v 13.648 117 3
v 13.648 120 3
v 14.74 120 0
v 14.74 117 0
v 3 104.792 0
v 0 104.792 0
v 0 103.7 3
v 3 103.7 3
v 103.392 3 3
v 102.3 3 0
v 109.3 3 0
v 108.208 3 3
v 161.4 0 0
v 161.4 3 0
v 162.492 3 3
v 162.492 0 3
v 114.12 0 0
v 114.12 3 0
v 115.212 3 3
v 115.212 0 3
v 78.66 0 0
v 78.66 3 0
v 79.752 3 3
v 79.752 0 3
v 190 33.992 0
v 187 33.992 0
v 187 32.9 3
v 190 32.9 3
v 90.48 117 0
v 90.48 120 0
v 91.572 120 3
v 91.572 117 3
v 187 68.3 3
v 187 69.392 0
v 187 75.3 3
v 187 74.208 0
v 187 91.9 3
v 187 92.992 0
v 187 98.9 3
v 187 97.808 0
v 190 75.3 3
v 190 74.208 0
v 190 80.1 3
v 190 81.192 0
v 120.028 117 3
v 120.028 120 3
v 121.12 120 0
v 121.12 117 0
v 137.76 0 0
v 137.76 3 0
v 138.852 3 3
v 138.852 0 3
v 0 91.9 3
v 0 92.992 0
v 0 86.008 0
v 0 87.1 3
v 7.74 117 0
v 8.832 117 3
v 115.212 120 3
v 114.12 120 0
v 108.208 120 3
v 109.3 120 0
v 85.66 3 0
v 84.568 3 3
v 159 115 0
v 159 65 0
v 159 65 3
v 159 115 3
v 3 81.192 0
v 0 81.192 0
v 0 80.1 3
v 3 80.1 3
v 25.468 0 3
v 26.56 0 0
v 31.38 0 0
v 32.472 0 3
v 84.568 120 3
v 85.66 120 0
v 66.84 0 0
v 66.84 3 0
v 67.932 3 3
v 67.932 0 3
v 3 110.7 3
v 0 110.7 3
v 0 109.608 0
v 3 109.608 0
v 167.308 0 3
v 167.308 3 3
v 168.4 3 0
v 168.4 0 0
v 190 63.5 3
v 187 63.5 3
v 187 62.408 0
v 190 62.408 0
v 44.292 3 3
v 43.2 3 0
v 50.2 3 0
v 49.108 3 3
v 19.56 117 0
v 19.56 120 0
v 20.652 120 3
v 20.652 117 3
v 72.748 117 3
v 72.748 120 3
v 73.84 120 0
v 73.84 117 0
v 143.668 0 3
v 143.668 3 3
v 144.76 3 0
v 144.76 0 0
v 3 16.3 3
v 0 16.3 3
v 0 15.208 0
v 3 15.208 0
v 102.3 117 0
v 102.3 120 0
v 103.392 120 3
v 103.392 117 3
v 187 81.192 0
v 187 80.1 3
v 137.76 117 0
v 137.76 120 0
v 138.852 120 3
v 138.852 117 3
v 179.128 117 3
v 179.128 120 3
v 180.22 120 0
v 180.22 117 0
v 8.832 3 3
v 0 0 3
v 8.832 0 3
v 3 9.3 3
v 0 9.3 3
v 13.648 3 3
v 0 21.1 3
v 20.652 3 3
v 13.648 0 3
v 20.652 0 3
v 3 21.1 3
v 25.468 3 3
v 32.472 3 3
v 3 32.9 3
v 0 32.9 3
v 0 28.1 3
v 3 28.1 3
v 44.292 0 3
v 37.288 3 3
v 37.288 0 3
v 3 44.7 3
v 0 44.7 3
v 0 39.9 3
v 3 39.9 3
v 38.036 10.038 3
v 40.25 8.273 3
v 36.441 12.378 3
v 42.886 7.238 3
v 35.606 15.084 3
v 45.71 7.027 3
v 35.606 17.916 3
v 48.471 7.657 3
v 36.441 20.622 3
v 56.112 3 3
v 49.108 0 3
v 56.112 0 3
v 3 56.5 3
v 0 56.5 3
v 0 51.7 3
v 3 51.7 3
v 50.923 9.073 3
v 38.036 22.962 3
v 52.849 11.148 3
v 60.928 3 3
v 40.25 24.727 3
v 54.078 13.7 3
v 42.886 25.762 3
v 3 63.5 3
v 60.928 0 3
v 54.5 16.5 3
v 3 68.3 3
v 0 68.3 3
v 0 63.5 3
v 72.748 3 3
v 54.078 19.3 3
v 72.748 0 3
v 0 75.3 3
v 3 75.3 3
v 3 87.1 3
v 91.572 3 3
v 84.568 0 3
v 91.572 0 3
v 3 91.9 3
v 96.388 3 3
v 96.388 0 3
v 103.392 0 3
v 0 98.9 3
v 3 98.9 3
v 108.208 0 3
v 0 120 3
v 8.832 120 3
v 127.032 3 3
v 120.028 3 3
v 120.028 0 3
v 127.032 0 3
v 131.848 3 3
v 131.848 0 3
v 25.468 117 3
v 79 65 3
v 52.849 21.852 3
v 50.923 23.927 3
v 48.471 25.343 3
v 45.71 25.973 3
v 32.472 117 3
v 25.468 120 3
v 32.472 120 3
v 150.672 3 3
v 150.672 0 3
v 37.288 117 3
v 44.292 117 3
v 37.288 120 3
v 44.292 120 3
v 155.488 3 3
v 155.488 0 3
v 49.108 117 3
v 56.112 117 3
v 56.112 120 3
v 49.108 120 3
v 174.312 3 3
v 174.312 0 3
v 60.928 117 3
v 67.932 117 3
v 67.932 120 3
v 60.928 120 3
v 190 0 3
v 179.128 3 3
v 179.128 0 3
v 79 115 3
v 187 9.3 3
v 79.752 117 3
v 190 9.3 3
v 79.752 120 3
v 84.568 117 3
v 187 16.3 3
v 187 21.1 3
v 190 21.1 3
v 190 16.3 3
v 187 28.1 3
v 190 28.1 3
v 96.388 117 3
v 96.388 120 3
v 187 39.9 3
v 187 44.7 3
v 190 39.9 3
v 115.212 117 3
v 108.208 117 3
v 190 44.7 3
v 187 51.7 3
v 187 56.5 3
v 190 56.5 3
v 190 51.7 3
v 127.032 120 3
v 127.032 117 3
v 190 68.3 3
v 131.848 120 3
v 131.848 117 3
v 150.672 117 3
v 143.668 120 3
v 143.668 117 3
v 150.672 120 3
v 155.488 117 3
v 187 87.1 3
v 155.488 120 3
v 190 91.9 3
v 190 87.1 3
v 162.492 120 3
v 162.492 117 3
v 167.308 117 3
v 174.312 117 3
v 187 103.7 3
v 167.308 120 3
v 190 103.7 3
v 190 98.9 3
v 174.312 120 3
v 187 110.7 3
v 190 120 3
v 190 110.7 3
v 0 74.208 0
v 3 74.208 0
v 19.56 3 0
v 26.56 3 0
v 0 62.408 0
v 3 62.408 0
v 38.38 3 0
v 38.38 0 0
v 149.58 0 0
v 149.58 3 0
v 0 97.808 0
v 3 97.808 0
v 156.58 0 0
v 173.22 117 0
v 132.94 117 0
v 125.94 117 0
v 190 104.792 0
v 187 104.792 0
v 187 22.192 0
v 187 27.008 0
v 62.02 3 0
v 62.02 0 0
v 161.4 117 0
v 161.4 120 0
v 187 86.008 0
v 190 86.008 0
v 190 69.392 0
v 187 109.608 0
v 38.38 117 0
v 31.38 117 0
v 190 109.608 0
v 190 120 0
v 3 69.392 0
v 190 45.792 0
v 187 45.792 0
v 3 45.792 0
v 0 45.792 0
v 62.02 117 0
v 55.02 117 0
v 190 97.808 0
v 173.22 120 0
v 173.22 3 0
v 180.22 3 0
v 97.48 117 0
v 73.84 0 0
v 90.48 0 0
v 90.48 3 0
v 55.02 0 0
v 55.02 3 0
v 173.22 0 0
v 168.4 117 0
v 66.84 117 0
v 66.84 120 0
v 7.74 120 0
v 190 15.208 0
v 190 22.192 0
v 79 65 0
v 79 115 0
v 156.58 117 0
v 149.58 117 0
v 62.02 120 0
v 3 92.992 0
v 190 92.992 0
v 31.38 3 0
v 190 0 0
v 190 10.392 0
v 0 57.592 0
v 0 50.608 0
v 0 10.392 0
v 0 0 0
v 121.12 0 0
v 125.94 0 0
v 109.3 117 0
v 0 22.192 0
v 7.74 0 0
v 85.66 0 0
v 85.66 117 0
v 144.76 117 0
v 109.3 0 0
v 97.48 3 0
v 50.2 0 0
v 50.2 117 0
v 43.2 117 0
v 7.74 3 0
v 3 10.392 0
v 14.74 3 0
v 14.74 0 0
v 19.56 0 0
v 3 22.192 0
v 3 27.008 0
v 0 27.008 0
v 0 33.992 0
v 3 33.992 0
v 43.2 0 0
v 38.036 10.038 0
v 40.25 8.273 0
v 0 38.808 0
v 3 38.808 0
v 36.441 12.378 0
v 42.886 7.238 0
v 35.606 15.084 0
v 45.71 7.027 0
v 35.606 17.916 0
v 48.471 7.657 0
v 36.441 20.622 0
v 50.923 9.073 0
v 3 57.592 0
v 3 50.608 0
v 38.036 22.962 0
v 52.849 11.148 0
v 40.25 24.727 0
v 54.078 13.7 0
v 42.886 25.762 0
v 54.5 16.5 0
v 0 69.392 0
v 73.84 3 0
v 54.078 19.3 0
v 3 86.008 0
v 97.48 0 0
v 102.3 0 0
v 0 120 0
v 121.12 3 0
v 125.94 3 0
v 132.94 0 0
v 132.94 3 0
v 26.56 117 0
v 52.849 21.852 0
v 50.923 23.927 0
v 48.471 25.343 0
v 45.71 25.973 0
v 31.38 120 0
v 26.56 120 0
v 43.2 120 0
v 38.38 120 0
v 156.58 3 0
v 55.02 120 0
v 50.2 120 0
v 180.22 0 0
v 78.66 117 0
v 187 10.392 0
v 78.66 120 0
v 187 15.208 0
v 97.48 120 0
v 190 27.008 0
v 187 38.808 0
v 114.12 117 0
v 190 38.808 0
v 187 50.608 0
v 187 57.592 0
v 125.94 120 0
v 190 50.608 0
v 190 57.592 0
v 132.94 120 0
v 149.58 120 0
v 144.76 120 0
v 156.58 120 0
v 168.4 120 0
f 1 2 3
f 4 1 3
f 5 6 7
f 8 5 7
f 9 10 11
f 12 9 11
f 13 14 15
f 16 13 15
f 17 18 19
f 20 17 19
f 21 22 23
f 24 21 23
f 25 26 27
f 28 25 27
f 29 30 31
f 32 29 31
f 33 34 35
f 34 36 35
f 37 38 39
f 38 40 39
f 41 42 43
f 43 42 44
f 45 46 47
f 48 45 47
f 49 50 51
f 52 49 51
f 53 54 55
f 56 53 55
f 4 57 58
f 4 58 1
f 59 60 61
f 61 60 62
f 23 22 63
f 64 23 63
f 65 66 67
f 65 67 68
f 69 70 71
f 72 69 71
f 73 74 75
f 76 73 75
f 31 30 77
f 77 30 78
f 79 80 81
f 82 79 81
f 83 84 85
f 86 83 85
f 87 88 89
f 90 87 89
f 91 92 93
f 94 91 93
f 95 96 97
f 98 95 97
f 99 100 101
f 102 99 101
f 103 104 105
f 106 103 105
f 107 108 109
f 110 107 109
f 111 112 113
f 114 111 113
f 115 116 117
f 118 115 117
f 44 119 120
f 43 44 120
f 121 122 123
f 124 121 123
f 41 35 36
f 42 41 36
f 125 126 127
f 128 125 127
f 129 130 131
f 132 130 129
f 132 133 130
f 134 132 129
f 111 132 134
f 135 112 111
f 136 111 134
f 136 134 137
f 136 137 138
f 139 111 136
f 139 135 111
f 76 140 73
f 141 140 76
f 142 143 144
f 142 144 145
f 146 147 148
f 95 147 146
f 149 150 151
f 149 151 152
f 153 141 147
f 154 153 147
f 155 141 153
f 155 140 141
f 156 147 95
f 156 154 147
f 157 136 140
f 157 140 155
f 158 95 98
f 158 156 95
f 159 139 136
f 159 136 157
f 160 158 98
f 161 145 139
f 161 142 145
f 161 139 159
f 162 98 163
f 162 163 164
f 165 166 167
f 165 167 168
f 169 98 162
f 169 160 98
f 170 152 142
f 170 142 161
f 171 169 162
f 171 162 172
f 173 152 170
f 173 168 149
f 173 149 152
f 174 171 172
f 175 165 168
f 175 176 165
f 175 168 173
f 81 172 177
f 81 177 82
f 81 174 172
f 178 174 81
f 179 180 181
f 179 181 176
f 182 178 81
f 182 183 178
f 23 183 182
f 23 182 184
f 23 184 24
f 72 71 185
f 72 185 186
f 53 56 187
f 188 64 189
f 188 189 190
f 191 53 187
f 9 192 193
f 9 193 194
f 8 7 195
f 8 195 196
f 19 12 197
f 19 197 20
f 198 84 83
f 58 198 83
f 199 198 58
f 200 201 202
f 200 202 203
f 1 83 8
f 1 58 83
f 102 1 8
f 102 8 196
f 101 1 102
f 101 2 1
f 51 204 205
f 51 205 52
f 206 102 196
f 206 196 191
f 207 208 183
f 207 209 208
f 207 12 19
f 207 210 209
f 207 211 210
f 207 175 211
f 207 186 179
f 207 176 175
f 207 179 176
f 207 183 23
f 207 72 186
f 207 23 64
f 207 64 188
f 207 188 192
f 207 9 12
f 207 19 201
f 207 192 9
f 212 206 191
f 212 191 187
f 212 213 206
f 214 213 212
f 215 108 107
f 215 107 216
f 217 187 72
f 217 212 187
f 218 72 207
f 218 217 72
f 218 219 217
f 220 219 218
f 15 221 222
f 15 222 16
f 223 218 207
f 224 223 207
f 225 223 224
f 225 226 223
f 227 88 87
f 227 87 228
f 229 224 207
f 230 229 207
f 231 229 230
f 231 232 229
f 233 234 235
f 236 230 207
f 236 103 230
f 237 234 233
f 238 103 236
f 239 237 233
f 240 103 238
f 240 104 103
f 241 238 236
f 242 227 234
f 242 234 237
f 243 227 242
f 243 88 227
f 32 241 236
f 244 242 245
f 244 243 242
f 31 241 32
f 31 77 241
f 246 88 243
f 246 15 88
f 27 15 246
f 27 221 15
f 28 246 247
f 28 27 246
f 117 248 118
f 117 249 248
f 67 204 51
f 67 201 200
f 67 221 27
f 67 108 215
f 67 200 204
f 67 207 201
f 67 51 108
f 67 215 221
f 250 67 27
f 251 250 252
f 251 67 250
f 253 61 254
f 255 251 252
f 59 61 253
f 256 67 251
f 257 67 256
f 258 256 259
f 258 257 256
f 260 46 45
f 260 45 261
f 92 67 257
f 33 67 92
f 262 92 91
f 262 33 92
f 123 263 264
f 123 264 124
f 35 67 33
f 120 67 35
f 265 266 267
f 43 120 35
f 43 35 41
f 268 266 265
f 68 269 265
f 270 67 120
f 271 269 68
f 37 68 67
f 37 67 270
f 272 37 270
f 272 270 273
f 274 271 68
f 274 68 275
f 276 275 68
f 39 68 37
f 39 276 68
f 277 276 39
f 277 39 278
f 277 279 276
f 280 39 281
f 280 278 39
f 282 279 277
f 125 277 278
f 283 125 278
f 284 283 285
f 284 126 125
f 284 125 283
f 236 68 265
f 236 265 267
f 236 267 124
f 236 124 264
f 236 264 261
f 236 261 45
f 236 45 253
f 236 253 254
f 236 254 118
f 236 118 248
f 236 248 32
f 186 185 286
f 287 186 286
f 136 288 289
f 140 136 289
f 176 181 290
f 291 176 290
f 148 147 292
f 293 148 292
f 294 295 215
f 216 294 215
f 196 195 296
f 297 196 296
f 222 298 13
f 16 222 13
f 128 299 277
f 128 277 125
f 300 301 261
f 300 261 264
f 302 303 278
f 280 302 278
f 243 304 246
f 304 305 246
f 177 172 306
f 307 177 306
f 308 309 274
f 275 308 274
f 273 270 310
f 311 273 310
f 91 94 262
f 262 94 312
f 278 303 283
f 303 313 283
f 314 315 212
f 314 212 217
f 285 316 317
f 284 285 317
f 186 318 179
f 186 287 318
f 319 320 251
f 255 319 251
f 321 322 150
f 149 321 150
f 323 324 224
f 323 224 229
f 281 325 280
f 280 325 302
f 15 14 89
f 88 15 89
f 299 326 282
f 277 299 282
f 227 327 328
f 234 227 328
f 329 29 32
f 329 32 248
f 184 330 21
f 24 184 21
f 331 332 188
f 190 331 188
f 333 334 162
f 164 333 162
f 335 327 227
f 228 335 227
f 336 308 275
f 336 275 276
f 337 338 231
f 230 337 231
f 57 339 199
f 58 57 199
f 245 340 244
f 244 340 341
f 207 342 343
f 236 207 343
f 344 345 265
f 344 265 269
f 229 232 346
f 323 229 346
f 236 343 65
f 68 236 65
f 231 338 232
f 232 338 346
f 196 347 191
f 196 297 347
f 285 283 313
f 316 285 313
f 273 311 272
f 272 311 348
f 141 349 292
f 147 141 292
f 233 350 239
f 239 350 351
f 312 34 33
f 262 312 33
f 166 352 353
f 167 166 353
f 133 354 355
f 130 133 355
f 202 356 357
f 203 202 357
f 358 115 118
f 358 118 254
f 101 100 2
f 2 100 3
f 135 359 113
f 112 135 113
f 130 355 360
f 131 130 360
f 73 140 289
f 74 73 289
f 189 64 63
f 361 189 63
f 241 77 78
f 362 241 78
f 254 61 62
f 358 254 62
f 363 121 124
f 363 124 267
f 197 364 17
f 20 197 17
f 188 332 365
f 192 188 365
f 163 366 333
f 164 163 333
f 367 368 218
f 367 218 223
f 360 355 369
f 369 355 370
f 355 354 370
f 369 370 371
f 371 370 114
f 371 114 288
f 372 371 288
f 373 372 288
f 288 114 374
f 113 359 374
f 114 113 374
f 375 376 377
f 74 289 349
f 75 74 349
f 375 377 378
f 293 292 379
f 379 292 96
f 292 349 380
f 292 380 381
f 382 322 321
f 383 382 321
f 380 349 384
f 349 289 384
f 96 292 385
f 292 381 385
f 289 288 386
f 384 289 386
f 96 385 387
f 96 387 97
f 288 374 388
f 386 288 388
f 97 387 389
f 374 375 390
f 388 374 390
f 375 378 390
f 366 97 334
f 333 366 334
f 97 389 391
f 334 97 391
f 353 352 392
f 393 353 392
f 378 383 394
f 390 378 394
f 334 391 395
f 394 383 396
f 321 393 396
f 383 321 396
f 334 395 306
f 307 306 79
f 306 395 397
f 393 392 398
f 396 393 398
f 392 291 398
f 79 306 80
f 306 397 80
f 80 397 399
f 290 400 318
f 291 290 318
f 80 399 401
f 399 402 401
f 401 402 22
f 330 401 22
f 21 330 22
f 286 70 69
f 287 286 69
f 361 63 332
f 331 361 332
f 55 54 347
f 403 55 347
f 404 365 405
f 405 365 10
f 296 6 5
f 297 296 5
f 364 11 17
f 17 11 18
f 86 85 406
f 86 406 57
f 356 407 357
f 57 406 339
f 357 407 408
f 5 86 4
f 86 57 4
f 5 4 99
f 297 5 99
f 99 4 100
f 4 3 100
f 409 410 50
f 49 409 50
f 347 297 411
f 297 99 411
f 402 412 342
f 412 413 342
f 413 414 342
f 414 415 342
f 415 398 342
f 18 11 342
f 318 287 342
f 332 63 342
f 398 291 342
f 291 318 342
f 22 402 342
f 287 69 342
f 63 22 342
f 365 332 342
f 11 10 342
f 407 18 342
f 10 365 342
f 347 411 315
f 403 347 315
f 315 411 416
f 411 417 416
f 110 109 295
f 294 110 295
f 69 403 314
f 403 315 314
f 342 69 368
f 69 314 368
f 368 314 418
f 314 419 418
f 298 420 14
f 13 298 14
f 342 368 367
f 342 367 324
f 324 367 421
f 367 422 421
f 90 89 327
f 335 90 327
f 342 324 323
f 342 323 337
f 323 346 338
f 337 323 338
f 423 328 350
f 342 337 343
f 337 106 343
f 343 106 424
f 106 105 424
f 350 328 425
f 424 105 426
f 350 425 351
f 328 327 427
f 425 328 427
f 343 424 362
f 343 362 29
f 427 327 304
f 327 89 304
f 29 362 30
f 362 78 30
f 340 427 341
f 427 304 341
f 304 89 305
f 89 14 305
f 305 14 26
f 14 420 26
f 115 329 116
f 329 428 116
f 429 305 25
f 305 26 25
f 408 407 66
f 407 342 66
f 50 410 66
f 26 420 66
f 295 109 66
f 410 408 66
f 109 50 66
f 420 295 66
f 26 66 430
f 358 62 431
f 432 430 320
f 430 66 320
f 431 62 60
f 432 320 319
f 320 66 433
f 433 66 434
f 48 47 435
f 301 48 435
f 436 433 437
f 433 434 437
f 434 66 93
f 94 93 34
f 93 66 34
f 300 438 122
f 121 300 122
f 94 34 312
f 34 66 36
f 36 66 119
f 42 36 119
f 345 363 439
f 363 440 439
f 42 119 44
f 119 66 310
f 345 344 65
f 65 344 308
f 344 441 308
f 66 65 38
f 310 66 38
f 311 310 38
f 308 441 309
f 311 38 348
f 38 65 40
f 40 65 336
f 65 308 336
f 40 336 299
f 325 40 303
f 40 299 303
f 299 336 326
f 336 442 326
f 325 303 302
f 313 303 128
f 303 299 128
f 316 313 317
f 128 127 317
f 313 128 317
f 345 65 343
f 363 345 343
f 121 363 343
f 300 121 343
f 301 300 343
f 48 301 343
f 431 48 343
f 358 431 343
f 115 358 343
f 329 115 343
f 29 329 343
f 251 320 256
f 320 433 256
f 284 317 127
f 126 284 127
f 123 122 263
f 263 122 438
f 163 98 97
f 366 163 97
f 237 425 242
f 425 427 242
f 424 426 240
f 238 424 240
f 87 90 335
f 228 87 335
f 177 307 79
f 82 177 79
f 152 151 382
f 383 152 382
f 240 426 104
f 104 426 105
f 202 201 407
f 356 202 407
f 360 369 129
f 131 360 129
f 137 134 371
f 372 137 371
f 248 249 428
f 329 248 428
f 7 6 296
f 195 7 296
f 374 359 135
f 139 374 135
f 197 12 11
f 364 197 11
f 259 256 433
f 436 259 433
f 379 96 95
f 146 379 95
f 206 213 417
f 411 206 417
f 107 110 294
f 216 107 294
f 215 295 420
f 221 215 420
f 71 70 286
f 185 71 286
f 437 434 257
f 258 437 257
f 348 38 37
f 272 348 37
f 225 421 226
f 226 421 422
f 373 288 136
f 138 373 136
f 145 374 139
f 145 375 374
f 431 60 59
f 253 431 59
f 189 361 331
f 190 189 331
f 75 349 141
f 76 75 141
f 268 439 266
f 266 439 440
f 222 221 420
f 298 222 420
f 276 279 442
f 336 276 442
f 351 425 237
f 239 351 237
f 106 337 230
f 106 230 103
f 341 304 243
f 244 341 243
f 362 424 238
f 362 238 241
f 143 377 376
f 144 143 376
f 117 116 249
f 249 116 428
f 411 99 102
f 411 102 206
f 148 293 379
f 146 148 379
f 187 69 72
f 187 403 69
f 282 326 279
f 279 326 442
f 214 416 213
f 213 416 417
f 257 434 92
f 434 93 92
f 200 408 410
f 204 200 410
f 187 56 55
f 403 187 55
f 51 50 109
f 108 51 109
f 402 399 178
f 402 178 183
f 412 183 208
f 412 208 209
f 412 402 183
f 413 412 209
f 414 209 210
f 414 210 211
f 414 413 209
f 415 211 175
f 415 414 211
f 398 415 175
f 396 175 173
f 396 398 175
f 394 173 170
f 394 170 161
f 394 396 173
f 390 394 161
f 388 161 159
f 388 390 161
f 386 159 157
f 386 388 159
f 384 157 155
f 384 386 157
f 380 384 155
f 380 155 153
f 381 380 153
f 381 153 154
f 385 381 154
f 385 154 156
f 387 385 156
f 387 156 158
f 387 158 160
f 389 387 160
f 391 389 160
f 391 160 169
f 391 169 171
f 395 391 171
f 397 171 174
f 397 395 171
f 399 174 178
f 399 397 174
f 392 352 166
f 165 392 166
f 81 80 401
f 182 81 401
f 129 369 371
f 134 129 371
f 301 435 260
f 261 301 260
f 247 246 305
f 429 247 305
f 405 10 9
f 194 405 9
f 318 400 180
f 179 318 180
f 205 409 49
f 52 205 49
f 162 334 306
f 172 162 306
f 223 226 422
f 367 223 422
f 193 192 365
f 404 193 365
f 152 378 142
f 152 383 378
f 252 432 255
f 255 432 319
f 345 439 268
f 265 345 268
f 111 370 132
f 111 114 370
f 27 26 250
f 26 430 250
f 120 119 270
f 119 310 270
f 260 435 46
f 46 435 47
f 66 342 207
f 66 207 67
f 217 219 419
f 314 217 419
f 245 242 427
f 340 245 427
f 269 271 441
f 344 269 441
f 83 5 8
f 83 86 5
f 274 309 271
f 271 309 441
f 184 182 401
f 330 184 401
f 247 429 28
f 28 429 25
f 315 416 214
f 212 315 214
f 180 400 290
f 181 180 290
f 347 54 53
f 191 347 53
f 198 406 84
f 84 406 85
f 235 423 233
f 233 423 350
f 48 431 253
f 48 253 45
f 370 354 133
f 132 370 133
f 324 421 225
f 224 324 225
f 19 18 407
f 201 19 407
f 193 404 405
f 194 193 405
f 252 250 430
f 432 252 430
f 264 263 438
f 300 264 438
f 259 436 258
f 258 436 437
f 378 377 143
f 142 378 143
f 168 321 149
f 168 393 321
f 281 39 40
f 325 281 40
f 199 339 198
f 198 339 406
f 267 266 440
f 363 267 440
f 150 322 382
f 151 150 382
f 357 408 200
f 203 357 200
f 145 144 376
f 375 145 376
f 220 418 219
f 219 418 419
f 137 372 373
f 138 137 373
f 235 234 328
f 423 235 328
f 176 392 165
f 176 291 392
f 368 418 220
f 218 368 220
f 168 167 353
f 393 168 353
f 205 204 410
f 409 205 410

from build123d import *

# Parameters (mm, degrees)
SKETCH1_R           = 9.5
SKETCH1_W           = 80
SKETCH1_H           = 50
BOSS_EXTRUDE1_DEPTH = 3
CUT_EXTRUDE1_DEPTH  = 3
CUT_EXTRUDE3_START  = -117
CUT_EXTRUDE3_DEPTH  = 187
CUT_EXTRUDE5_DEPTH  = 3
CUT_EXTRUDE6_START  = -187
CUT_EXTRUDE6_DEPTH  = 3


with BuildPart() as part:
    # Sketch1 → Boss-Extrude1 (new body)
    with BuildSketch(Plane.XY):
        Polygon((10, 0), (190, 0), (190, 120), (9.862497021, 120), (0, 120), (0, 0), align=None)
        with Locations((45, 16.5)):
            Circle(SKETCH1_R, mode=Mode.SUBTRACT)
        with Locations((119, 90)):
            Rectangle(SKETCH1_W, SKETCH1_H, mode=Mode.SUBTRACT)
    extrude(amount=BOSS_EXTRUDE1_DEPTH)

    # Sketch3 → Cut-Extrude1 (cut)
    with BuildSketch(Plane(origin=(0, 120, 0), x_dir=(1, 0, 0), z_dir=(0, 1, 0))):
        Polygon((179.128089803, -3), (180.22, 0), (173.22, 0), (174.311910703, -3), align=None)
        Polygon((167.308089803, -3), (168.4, 0), (161.4, 0), (162.491910703, -3), align=None)
        Polygon((155.488089803, -3), (156.58, 0), (149.58, 0), (150.671910703, -3), align=None)
        Polygon((143.668089803, -3), (144.76, 0), (137.76, 0), (138.851910703, -3), align=None)
        Polygon((131.848089803, -3), (132.94, 0), (125.94, 0), (127.031910703, -3), align=None)
        Polygon((120.028089803, -3), (121.12, 0), (114.12, 0), (115.211910703, -3), align=None)
        Polygon((108.208089803, -3), (109.3, 0), (102.3, 0), (103.391910703, -3), align=None)
        Polygon((96.388089803, -3), (97.48, 0), (90.48, 0), (91.571910703, -3), align=None)
        Polygon((84.568089803, -3), (85.66, 0), (78.66, 0), (79.751910703, -3), align=None)
        Polygon((72.748089803, -3), (73.84, 0), (66.84, 0), (67.931910703, -3), align=None)
        Polygon((60.928089803, -3), (62.02, 0), (55.02, 0), (56.111910703, -3), align=None)
        Polygon((49.108089803, -3), (50.2, 0), (43.2, 0), (44.291910703, -3), align=None)
        Polygon((37.288089803, -3), (38.38, 0), (31.38, 0), (32.471910703, -3), align=None)
        Polygon((25.468089803, -3), (26.56, 0), (19.56, 0), (20.651910703, -3), align=None)
        Polygon((13.648089803, -3), (14.74, 0), (7.74, 0), (8.831910703, -3), align=None)
    extrude(amount=-CUT_EXTRUDE1_DEPTH, mode=Mode.SUBTRACT)

    # Sketch3<2> → Cut-Extrude3 (cut)
    with BuildSketch(Plane(origin=(0, 120, 0), x_dir=(1, 0, 0), z_dir=(0, 1, 0)).offset(CUT_EXTRUDE3_START)):
        Polygon((179.128089803, -3), (180.22, 0), (173.22, 0), (174.311910703, -3), align=None)
        Polygon((167.308089803, -3), (168.4, 0), (161.4, 0), (162.491910703, -3), align=None)
        Polygon((155.488089803, -3), (156.58, 0), (149.58, 0), (150.671910703, -3), align=None)
        Polygon((143.668089803, -3), (144.76, 0), (137.76, 0), (138.851910703, -3), align=None)
        Polygon((131.848089803, -3), (132.94, 0), (125.94, 0), (127.031910703, -3), align=None)
        Polygon((120.028089803, -3), (121.12, 0), (114.12, 0), (115.211910703, -3), align=None)
        Polygon((108.208089803, -3), (109.3, 0), (102.3, 0), (103.391910703, -3), align=None)
        Polygon((96.388089803, -3), (97.48, 0), (90.48, 0), (91.571910703, -3), align=None)
        Polygon((84.568089803, -3), (85.66, 0), (78.66, 0), (79.751910703, -3), align=None)
        Polygon((72.748089803, -3), (73.84, 0), (66.84, 0), (67.931910703, -3), align=None)
        Polygon((60.928089803, -3), (62.02, 0), (55.02, 0), (56.111910703, -3), align=None)
        Polygon((49.108089803, -3), (50.2, 0), (43.2, 0), (44.291910703, -3), align=None)
        Polygon((37.288089803, -3), (38.38, 0), (31.38, 0), (32.471910703, -3), align=None)
        Polygon((25.468089803, -3), (26.56, 0), (19.56, 0), (20.651910703, -3), align=None)
        Polygon((13.648089803, -3), (14.74, 0), (7.74, 0), (8.831910703, -3), align=None)
    extrude(amount=-CUT_EXTRUDE3_DEPTH, mode=Mode.SUBTRACT)

    # Sketch6 → Cut-Extrude5 (cut)
    with BuildSketch(Plane.ZY):
        Polygon((0, 104.7919109), (3, 103.7), (3, 110.7), (0, 109.60809), align=None)
        Polygon((0, 92.9919109), (3, 91.9), (3, 98.9), (0, 97.80809), align=None)
        Polygon((0, 81.1919109), (3, 80.1), (3, 87.1), (0, 86.00809), align=None)
        Polygon((0, 69.3919109), (3, 68.3), (3, 75.3), (0, 74.20809), align=None)
        Polygon((0, 57.5919109), (3, 56.5), (3, 63.5), (0, 62.40809), align=None)
        Polygon((0, 45.7919109), (3, 44.7), (3, 51.7), (0, 50.60809), align=None)
        Polygon((0, 33.9919109), (3, 32.9), (3, 39.9), (0, 38.80809), align=None)
        Polygon((0, 22.1919109), (3, 21.1), (3, 28.1), (0, 27.00809), align=None)
        Polygon((0, 10.3919109), (3, 9.3), (3, 16.3), (0, 15.20809), align=None)
    extrude(amount=-CUT_EXTRUDE5_DEPTH, mode=Mode.SUBTRACT)

    # Sketch6<3> → Cut-Extrude6 (cut)
    with BuildSketch(Plane.ZY.offset(CUT_EXTRUDE6_START)):
        Polygon((0, 104.7919109), (3, 103.7), (3, 110.7), (0, 109.60809), align=None)
        Polygon((0, 92.9919109), (3, 91.9), (3, 98.9), (0, 97.80809), align=None)
        Polygon((0, 81.1919109), (3, 80.1), (3, 87.1), (0, 86.00809), align=None)
        Polygon((0, 69.3919109), (3, 68.3), (3, 75.3), (0, 74.20809), align=None)
        Polygon((0, 57.5919109), (3, 56.5), (3, 63.5), (0, 62.40809), align=None)
        Polygon((0, 45.7919109), (3, 44.7), (3, 51.7), (0, 50.60809), align=None)
        Polygon((0, 33.9919109), (3, 32.9), (3, 39.9), (0, 38.80809), align=None)
        Polygon((0, 22.1919109), (3, 21.1), (3, 28.1), (0, 27.00809), align=None)
        Polygon((0, 10.3919109), (3, 9.3), (3, 16.3), (0, 15.20809), align=None)
    extrude(amount=-CUT_EXTRUDE6_DEPTH, mode=Mode.SUBTRACT)


solid = part.part
